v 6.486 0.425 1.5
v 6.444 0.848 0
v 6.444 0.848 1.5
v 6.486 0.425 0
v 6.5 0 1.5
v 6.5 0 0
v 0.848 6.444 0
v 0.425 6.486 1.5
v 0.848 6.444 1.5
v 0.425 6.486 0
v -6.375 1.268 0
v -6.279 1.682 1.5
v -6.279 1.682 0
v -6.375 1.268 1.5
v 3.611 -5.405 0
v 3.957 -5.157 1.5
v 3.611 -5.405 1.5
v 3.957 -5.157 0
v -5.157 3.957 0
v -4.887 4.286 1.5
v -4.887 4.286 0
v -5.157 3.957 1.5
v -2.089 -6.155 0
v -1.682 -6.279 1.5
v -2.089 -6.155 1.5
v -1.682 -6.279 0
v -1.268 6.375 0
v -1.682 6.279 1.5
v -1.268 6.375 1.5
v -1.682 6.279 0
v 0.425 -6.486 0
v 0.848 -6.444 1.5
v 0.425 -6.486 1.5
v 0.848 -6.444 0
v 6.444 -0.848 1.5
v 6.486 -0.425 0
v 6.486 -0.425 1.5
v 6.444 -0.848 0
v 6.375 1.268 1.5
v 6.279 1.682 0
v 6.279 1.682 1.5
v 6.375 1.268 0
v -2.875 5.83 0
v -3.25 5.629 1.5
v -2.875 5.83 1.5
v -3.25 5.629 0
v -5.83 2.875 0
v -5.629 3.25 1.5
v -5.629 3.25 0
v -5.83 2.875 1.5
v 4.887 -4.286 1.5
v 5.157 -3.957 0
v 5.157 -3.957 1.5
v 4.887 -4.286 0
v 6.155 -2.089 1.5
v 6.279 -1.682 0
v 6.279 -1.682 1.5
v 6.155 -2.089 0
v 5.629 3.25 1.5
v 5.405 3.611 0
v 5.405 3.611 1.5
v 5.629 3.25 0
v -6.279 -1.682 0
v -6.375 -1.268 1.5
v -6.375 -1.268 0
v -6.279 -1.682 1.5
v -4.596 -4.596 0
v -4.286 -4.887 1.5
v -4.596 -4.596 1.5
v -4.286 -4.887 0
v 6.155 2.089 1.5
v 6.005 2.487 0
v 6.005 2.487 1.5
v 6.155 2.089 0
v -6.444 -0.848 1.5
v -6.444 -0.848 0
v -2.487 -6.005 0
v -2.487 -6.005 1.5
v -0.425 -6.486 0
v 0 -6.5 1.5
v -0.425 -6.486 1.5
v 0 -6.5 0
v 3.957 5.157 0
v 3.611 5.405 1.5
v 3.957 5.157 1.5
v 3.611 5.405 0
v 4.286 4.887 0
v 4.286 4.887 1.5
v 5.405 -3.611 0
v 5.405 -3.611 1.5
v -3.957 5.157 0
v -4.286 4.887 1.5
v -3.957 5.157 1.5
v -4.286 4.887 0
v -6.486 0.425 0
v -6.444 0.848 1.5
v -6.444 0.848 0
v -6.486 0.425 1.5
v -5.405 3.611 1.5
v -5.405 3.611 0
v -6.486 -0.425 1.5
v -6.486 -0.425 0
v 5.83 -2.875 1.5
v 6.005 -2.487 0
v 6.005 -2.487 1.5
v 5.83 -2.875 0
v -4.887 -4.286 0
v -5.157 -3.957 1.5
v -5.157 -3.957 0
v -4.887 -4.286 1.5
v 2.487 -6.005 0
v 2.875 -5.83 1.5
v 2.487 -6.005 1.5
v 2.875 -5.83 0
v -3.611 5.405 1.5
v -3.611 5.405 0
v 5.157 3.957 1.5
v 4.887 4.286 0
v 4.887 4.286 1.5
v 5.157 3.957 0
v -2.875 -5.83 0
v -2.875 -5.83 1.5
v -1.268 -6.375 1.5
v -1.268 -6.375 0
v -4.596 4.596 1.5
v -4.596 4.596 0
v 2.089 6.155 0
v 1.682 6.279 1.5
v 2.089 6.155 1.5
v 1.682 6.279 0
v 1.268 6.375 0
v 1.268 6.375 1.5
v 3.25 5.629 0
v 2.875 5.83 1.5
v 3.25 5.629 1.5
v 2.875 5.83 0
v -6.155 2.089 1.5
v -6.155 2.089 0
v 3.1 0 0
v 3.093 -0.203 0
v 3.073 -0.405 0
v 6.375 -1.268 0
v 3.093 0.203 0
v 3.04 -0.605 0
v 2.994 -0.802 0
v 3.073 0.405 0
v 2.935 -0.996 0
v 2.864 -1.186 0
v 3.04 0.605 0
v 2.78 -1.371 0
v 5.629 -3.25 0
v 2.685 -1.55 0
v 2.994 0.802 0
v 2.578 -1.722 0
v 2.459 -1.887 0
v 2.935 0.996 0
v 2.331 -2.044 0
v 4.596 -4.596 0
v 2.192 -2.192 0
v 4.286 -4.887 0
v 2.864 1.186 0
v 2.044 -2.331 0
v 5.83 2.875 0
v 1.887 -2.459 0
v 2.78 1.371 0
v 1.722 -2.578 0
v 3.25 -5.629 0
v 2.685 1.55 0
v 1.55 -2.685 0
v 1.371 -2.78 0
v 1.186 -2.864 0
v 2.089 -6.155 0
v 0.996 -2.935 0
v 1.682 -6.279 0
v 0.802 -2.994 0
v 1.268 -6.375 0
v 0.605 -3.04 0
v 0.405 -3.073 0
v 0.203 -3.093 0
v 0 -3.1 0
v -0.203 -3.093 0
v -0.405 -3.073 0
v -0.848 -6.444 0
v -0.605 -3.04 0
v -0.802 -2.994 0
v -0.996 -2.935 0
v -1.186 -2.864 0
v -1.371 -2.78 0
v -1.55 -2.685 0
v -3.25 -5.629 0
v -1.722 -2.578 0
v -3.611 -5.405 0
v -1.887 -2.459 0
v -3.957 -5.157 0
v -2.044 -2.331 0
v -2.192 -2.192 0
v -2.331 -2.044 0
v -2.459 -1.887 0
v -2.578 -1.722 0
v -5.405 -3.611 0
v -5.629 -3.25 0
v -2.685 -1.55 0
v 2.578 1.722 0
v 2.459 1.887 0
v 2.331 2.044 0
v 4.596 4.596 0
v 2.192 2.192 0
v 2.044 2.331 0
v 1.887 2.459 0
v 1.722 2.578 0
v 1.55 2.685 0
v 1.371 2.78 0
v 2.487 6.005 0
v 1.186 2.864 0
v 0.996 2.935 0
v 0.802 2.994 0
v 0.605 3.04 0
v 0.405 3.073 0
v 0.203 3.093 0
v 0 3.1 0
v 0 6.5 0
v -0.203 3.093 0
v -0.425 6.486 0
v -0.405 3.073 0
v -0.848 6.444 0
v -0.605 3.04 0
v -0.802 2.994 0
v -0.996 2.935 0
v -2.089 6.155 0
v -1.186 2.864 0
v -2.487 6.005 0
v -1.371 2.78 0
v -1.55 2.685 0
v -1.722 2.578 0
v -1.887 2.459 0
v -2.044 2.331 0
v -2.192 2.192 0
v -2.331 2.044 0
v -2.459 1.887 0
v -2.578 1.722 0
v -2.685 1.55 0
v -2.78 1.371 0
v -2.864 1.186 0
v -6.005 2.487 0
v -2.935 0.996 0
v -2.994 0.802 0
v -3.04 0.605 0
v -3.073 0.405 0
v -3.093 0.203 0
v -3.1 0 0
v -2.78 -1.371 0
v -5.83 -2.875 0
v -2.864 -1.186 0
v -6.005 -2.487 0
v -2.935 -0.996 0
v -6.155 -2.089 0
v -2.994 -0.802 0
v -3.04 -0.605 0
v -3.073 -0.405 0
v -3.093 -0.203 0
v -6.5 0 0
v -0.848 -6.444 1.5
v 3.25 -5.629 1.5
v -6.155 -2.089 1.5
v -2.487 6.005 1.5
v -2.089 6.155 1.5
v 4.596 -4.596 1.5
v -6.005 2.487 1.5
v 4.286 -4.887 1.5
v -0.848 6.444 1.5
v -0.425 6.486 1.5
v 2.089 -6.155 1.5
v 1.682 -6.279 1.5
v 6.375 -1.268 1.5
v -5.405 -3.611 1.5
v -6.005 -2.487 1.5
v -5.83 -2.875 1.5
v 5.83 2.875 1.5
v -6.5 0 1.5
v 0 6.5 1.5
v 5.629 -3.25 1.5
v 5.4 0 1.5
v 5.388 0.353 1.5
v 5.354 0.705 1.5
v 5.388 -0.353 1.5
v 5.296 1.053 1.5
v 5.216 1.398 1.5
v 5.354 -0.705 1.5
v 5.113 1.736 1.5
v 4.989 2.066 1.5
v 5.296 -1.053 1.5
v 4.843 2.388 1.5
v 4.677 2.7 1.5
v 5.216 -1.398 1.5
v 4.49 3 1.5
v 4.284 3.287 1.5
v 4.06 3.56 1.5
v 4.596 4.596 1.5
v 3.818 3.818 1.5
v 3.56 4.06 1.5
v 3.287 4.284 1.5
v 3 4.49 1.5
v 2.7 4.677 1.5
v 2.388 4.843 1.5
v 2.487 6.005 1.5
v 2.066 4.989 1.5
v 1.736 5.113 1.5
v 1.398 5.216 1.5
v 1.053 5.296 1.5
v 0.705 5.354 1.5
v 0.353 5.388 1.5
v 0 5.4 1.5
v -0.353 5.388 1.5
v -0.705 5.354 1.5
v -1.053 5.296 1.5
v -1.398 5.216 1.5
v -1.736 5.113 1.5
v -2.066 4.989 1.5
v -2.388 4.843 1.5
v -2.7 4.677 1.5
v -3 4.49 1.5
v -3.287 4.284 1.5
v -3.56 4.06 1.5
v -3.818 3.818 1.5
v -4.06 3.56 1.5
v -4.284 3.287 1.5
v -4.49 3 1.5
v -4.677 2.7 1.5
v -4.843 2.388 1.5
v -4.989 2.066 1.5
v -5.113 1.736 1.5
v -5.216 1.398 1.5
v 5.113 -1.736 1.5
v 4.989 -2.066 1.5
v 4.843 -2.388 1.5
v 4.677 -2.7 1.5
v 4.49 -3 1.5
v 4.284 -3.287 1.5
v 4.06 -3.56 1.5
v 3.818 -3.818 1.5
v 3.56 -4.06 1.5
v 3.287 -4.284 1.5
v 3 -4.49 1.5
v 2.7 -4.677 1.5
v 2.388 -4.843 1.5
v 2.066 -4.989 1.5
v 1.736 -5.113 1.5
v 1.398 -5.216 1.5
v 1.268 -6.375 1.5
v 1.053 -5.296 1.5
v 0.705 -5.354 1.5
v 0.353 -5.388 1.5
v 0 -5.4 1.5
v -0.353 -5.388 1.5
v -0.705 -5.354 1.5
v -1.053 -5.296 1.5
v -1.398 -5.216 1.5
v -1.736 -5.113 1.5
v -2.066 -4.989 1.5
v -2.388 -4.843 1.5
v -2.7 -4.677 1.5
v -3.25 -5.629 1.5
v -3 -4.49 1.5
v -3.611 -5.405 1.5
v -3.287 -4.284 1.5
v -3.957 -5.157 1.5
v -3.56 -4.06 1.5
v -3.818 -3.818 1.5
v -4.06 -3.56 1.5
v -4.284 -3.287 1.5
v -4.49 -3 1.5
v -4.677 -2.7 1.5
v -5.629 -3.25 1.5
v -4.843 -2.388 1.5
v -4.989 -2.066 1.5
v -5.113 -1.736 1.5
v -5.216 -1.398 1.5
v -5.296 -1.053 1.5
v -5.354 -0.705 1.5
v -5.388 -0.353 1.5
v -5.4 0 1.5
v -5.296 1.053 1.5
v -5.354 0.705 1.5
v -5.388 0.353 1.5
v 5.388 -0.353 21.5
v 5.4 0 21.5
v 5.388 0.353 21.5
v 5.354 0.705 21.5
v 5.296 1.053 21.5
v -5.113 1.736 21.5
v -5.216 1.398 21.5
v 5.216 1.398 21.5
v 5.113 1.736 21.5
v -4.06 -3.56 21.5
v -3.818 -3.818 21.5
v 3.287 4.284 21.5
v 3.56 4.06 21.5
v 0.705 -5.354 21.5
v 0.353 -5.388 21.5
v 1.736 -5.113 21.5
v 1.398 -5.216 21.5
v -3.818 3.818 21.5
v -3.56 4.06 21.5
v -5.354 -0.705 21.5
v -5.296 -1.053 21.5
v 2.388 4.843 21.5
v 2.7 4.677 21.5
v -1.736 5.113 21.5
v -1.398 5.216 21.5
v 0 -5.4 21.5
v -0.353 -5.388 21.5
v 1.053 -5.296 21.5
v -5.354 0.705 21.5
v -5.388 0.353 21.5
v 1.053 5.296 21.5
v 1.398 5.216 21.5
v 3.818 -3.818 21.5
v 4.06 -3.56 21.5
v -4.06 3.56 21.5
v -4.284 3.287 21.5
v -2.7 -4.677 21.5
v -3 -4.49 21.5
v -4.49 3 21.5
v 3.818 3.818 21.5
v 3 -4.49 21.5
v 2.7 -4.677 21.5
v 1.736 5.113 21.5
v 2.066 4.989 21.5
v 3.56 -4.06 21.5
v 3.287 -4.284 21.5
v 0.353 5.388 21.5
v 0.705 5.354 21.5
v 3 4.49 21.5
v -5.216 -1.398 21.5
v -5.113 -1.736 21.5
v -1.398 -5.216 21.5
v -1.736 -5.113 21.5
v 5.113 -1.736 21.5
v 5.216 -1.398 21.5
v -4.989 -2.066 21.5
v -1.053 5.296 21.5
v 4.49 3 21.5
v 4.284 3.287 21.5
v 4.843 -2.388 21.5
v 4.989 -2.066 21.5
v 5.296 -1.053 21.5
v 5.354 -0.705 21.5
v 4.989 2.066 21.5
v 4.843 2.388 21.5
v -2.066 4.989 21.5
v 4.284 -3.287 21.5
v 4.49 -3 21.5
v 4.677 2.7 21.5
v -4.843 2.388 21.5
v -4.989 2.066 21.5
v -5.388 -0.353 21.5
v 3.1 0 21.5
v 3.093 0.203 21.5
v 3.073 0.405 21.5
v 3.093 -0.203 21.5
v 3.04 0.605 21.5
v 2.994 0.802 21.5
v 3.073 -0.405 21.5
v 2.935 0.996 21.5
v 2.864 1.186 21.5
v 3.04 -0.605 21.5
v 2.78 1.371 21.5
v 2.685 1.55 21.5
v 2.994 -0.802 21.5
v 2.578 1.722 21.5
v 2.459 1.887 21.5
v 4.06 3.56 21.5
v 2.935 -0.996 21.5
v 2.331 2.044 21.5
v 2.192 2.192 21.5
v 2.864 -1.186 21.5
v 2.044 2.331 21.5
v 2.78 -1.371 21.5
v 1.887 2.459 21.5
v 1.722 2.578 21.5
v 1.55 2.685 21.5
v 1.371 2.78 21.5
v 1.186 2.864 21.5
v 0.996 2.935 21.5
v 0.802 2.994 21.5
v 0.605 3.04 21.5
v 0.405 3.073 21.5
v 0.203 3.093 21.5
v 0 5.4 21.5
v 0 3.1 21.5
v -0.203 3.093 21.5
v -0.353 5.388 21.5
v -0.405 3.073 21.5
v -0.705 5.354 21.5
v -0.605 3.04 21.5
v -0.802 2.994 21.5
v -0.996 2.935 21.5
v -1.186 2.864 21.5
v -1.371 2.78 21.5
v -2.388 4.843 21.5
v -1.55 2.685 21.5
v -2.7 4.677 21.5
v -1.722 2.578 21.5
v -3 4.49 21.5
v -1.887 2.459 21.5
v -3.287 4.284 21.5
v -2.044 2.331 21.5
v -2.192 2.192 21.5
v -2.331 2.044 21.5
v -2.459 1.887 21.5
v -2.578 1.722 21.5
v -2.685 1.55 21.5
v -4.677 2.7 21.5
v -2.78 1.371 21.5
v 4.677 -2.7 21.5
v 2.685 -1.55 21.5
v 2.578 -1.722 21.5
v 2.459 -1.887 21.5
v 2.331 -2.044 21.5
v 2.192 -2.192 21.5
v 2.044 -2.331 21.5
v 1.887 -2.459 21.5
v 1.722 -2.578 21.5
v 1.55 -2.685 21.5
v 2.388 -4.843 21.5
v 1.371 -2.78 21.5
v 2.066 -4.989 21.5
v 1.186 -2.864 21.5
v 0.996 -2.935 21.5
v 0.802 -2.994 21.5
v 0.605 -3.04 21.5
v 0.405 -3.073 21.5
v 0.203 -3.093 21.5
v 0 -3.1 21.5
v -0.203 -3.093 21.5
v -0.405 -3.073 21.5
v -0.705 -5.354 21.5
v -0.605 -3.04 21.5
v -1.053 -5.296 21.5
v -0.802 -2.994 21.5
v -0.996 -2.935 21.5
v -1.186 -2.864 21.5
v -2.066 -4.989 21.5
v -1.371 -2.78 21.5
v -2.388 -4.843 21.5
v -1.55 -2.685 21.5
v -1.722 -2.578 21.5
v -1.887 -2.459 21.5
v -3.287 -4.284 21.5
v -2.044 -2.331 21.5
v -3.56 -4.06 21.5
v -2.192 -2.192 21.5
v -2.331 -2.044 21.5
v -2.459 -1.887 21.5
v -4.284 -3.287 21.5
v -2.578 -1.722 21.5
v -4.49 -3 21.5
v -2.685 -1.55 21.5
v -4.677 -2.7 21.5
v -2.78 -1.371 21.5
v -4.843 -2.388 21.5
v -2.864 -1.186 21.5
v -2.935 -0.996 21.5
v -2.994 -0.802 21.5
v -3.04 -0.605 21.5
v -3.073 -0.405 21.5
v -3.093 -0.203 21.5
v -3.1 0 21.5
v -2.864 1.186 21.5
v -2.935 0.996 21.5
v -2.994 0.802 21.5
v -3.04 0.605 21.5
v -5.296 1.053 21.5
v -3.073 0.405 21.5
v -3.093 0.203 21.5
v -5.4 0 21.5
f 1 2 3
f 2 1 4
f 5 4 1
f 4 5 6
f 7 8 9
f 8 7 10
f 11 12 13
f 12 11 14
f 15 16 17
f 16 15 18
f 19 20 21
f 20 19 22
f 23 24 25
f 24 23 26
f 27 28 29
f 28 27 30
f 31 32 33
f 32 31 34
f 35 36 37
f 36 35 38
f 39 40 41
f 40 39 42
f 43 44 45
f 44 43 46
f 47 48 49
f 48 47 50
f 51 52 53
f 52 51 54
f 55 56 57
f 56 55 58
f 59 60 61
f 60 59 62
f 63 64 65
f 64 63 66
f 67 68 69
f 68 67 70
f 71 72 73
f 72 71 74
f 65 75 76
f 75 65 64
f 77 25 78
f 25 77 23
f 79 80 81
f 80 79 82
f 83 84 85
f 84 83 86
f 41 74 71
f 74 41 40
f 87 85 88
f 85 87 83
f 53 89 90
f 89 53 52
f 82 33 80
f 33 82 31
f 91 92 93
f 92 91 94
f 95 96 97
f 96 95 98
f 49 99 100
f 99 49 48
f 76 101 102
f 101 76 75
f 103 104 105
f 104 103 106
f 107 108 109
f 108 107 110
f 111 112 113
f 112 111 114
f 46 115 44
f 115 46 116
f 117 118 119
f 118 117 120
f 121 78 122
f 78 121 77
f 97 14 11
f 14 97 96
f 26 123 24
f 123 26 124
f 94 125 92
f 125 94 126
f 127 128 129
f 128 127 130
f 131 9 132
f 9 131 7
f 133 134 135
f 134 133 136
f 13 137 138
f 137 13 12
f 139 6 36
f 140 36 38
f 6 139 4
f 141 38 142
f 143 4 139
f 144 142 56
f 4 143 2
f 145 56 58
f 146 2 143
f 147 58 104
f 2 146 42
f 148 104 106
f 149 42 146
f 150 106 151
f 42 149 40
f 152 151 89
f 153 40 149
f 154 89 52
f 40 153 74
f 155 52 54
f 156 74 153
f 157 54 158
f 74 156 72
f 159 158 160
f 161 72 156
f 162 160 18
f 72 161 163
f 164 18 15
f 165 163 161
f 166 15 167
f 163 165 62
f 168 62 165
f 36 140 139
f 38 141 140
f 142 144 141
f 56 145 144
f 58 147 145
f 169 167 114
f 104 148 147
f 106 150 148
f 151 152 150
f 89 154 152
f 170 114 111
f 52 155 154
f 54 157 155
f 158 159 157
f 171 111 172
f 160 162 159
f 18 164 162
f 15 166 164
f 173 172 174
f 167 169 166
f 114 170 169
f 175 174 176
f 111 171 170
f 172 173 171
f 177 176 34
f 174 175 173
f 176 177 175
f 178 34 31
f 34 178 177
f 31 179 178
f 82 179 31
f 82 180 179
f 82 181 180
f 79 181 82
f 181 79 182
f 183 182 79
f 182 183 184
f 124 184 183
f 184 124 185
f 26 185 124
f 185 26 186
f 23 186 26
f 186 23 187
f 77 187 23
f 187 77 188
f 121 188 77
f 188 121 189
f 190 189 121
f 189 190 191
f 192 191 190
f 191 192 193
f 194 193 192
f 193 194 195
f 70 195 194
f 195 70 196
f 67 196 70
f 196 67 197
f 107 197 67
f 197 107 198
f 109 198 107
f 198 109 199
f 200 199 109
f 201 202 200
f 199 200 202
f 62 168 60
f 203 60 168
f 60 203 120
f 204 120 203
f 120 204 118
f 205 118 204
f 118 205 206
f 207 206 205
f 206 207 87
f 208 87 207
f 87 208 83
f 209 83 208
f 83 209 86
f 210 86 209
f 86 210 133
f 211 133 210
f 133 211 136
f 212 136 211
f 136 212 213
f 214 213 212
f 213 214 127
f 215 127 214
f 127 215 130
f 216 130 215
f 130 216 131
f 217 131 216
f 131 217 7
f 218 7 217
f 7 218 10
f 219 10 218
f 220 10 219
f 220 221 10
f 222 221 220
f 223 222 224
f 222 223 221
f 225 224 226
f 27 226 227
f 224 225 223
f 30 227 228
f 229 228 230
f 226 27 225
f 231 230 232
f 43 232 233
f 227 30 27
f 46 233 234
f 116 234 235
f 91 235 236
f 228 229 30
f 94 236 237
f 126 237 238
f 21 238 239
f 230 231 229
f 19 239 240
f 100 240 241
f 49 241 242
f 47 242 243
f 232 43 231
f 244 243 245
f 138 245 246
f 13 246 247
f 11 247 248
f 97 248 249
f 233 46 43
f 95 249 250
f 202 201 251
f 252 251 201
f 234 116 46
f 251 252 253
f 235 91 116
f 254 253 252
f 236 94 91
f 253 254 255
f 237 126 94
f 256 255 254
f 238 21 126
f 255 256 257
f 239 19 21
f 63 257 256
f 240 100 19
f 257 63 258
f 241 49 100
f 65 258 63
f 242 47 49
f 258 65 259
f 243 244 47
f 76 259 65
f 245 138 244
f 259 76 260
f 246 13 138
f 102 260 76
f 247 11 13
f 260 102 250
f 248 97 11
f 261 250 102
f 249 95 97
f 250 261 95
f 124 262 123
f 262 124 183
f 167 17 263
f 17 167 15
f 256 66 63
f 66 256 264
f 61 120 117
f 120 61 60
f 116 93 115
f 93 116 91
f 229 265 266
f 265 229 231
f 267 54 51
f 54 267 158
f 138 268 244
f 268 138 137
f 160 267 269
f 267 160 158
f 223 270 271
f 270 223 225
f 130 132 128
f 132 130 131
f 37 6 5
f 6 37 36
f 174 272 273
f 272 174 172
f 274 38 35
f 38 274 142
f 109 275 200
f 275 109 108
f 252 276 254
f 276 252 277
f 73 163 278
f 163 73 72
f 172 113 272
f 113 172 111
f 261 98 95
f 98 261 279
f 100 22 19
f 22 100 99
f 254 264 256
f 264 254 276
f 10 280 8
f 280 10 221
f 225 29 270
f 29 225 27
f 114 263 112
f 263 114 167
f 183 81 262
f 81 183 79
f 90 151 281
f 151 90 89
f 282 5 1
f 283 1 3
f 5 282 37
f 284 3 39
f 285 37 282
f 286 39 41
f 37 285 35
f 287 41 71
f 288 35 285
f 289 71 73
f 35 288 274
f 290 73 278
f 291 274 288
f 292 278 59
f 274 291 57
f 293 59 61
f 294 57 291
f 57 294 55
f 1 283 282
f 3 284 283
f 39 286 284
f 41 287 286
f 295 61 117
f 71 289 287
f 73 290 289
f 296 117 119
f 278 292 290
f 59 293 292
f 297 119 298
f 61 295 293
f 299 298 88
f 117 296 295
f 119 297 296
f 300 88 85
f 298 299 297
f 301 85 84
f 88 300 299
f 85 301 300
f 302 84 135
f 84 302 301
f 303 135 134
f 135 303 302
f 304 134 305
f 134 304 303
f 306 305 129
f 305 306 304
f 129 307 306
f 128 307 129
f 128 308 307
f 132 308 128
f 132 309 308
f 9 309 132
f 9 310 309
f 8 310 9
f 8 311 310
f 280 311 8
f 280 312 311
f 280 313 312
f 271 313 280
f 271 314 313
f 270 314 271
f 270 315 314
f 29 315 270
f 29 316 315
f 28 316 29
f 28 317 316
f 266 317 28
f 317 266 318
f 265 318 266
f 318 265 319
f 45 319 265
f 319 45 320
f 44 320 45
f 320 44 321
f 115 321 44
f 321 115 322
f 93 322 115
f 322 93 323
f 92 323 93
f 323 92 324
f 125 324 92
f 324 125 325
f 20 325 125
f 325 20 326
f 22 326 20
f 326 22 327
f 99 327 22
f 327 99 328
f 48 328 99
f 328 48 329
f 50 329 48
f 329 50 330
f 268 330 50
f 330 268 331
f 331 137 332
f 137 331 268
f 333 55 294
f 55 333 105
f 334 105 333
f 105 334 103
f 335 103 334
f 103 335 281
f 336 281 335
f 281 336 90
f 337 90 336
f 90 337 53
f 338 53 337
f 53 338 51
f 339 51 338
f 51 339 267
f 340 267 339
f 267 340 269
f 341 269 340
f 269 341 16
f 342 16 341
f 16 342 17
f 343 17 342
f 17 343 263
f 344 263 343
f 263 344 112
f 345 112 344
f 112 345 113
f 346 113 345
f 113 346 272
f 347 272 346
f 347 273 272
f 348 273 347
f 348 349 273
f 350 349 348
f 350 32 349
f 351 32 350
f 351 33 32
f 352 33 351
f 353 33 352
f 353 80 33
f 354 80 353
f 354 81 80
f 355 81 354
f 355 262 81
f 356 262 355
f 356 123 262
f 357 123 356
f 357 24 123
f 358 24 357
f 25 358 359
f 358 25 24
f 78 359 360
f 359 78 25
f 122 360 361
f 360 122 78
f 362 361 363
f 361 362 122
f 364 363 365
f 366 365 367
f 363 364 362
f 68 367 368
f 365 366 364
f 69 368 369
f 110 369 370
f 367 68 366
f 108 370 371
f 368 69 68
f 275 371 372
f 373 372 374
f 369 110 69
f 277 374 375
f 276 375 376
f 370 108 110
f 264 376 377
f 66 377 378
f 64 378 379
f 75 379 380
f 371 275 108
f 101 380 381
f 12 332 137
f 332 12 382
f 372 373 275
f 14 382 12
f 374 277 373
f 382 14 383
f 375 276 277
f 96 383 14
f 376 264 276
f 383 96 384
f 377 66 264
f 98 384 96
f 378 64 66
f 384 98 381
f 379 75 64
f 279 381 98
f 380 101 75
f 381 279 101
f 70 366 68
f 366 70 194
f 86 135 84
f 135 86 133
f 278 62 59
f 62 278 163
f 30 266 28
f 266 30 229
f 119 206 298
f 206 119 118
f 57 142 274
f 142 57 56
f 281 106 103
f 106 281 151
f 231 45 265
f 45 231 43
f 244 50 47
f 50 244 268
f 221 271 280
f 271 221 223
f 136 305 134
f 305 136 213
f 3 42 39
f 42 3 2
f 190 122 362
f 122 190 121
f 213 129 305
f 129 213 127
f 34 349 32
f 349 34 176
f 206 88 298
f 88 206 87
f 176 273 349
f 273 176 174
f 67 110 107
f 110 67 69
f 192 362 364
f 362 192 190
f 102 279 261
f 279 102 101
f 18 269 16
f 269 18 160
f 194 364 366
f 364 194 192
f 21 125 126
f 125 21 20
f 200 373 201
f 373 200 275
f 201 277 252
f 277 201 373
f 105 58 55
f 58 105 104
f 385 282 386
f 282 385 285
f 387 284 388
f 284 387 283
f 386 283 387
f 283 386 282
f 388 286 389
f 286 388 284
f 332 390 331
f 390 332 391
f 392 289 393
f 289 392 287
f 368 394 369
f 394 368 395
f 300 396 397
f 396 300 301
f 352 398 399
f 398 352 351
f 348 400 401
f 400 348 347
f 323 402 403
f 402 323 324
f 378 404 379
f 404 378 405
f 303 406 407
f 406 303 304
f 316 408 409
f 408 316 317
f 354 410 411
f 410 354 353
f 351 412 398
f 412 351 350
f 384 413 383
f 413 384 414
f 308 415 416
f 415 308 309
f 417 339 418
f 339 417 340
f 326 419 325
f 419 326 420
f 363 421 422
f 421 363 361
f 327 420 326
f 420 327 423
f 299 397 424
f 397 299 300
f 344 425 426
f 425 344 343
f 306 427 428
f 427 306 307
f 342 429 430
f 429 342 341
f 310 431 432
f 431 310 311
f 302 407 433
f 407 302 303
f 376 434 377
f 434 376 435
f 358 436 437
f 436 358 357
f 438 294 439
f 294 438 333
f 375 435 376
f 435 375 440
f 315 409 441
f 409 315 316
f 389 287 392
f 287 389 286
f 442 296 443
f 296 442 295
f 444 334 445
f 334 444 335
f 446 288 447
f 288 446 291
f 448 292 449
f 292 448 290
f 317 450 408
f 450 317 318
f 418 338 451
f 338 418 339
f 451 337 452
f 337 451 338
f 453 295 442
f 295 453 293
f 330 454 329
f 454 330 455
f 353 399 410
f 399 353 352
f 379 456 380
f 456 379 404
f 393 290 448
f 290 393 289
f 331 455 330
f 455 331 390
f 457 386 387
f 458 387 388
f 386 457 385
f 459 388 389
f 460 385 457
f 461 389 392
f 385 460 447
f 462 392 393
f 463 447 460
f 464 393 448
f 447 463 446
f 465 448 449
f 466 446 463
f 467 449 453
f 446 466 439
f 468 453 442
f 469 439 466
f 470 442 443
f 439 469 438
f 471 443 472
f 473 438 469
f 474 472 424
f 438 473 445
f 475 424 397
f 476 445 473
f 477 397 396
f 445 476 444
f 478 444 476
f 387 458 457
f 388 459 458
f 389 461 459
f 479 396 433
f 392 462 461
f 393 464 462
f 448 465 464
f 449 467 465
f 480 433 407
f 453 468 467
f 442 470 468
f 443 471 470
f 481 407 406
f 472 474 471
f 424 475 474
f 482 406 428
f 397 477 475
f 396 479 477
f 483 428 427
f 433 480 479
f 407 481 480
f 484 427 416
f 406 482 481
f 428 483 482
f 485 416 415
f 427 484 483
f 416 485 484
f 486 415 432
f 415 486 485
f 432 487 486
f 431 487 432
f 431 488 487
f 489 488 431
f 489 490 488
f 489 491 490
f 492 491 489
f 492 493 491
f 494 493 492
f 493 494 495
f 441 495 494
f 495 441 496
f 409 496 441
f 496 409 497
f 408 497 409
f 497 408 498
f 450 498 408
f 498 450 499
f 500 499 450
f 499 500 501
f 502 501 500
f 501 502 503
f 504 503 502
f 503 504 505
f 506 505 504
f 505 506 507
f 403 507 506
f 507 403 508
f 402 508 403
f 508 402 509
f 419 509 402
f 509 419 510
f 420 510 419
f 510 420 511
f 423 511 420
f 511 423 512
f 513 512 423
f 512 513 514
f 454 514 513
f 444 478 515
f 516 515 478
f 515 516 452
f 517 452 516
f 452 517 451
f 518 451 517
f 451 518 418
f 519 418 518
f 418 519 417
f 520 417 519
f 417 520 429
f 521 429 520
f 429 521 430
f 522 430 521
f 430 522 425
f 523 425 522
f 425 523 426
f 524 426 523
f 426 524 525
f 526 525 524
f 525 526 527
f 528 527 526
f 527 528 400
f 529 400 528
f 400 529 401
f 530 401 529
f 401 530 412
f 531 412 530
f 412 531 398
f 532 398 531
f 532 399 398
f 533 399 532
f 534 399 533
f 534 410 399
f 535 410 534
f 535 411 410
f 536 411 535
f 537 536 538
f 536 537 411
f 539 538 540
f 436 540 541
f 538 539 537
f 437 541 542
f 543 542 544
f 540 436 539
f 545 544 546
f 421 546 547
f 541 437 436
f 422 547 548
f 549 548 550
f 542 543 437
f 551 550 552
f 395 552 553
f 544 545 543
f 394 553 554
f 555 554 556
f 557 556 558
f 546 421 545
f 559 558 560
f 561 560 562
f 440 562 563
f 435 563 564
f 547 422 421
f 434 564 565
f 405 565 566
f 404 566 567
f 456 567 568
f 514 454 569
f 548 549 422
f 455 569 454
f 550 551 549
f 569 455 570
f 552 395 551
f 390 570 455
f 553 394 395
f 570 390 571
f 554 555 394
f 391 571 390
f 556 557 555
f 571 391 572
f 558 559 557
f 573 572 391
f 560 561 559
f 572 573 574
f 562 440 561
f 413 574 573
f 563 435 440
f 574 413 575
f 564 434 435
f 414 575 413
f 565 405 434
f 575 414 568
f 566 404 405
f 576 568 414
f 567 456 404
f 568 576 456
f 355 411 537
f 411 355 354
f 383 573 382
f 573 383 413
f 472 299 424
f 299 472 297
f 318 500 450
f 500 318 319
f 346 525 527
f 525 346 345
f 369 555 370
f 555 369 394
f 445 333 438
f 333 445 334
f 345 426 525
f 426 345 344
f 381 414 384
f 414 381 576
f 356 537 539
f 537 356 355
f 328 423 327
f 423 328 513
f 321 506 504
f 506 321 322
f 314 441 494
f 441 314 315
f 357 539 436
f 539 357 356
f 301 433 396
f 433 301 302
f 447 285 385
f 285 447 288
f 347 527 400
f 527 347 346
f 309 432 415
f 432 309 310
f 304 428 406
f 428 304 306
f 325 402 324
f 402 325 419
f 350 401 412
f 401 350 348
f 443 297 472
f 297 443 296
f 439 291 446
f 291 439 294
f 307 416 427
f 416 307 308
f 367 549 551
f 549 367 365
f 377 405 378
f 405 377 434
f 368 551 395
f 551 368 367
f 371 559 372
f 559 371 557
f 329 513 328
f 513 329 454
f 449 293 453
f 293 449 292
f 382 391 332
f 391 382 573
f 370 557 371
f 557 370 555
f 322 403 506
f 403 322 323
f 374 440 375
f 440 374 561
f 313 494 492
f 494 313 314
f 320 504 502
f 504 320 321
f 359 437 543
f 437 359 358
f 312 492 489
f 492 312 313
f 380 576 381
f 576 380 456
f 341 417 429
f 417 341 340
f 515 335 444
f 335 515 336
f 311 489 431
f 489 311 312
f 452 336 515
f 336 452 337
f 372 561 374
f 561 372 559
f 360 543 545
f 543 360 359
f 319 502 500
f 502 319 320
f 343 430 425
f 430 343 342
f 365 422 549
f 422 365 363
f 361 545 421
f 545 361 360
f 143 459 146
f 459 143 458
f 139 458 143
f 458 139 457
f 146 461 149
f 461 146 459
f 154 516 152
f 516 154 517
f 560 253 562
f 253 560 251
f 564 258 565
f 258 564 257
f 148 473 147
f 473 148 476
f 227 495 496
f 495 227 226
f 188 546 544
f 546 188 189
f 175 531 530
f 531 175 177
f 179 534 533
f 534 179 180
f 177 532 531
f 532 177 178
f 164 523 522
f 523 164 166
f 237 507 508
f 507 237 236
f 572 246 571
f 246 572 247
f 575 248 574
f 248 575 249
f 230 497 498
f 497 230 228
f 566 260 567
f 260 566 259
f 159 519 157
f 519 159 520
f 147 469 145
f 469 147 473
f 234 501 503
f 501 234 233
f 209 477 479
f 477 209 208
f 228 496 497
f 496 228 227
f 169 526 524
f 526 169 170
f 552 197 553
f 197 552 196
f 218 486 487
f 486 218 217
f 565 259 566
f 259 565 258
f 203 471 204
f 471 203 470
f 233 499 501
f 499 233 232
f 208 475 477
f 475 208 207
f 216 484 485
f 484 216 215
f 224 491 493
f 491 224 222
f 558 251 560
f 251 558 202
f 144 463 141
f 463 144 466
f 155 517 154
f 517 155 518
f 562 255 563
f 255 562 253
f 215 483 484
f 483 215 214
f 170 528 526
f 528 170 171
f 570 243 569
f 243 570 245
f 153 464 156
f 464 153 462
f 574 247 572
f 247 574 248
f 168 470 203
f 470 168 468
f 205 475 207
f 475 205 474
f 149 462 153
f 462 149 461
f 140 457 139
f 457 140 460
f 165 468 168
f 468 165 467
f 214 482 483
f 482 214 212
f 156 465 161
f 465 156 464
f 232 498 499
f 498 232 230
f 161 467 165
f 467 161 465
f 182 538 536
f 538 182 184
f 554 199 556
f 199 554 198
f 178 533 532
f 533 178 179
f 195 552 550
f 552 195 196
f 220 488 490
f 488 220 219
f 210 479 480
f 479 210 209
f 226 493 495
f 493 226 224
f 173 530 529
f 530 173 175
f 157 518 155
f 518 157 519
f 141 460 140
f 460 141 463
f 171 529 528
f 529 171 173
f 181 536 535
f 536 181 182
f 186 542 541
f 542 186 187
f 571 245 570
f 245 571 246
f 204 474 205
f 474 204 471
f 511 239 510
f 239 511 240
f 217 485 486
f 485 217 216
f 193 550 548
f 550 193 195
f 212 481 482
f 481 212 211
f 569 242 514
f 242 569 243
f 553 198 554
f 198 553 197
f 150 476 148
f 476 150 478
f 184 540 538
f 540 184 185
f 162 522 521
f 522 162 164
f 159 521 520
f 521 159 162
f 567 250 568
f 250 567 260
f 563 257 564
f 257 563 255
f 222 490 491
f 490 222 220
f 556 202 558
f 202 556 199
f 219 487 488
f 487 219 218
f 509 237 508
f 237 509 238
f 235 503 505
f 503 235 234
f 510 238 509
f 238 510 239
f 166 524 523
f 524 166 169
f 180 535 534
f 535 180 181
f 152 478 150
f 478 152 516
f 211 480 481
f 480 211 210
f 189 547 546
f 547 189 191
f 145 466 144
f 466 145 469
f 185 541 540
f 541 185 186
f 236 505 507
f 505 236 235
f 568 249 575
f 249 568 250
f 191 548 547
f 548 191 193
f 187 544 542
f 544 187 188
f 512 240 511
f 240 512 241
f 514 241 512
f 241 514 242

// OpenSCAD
// Adapter sleeve: lets a 0.2 mL PCR tube sit in a rack hole made for 1.5 mL tubes
// Printed upside down: collar on the bed, sleeve body rising upward.

$fn = 96;

// --- Dimensions (mm) ---
collar_d      = 13;    // collar outer diameter
collar_h      = 1.5;   // collar thickness (z = 0 to 1.5)
body_d        = 10.8;  // sleeve body outer diameter
total_h       = 21.5;  // overall height (top of sleeve body)
bore_d        = 6.2;   // straight through-bore diameter
eps           = 0.5;   // cutter overshoot past faces

difference() {
    union() {
        // Collar lying on the bed
        cylinder(d = collar_d, h = collar_h);
        // Sleeve body rising from the collar to total height
        translate([0, 0, collar_h - 0.01])
            cylinder(d = body_d, h = total_h - collar_h + 0.01);
    }
    // Straight bore through the full height, open at both ends
    translate([0, 0, -eps])
        cylinder(d = bore_d, h = total_h + 2 * eps);
}
